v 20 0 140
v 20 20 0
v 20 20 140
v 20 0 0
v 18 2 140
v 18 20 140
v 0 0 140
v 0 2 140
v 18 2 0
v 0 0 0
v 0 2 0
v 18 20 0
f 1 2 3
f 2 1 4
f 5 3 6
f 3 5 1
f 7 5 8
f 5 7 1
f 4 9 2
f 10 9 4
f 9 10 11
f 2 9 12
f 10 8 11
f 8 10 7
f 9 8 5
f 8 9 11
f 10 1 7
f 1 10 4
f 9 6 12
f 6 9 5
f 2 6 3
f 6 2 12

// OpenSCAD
width=20;
height=140;
t=2;


cube([width, t, 140]);

translate([width-t,0,0])
cube([t, width, 140]);
